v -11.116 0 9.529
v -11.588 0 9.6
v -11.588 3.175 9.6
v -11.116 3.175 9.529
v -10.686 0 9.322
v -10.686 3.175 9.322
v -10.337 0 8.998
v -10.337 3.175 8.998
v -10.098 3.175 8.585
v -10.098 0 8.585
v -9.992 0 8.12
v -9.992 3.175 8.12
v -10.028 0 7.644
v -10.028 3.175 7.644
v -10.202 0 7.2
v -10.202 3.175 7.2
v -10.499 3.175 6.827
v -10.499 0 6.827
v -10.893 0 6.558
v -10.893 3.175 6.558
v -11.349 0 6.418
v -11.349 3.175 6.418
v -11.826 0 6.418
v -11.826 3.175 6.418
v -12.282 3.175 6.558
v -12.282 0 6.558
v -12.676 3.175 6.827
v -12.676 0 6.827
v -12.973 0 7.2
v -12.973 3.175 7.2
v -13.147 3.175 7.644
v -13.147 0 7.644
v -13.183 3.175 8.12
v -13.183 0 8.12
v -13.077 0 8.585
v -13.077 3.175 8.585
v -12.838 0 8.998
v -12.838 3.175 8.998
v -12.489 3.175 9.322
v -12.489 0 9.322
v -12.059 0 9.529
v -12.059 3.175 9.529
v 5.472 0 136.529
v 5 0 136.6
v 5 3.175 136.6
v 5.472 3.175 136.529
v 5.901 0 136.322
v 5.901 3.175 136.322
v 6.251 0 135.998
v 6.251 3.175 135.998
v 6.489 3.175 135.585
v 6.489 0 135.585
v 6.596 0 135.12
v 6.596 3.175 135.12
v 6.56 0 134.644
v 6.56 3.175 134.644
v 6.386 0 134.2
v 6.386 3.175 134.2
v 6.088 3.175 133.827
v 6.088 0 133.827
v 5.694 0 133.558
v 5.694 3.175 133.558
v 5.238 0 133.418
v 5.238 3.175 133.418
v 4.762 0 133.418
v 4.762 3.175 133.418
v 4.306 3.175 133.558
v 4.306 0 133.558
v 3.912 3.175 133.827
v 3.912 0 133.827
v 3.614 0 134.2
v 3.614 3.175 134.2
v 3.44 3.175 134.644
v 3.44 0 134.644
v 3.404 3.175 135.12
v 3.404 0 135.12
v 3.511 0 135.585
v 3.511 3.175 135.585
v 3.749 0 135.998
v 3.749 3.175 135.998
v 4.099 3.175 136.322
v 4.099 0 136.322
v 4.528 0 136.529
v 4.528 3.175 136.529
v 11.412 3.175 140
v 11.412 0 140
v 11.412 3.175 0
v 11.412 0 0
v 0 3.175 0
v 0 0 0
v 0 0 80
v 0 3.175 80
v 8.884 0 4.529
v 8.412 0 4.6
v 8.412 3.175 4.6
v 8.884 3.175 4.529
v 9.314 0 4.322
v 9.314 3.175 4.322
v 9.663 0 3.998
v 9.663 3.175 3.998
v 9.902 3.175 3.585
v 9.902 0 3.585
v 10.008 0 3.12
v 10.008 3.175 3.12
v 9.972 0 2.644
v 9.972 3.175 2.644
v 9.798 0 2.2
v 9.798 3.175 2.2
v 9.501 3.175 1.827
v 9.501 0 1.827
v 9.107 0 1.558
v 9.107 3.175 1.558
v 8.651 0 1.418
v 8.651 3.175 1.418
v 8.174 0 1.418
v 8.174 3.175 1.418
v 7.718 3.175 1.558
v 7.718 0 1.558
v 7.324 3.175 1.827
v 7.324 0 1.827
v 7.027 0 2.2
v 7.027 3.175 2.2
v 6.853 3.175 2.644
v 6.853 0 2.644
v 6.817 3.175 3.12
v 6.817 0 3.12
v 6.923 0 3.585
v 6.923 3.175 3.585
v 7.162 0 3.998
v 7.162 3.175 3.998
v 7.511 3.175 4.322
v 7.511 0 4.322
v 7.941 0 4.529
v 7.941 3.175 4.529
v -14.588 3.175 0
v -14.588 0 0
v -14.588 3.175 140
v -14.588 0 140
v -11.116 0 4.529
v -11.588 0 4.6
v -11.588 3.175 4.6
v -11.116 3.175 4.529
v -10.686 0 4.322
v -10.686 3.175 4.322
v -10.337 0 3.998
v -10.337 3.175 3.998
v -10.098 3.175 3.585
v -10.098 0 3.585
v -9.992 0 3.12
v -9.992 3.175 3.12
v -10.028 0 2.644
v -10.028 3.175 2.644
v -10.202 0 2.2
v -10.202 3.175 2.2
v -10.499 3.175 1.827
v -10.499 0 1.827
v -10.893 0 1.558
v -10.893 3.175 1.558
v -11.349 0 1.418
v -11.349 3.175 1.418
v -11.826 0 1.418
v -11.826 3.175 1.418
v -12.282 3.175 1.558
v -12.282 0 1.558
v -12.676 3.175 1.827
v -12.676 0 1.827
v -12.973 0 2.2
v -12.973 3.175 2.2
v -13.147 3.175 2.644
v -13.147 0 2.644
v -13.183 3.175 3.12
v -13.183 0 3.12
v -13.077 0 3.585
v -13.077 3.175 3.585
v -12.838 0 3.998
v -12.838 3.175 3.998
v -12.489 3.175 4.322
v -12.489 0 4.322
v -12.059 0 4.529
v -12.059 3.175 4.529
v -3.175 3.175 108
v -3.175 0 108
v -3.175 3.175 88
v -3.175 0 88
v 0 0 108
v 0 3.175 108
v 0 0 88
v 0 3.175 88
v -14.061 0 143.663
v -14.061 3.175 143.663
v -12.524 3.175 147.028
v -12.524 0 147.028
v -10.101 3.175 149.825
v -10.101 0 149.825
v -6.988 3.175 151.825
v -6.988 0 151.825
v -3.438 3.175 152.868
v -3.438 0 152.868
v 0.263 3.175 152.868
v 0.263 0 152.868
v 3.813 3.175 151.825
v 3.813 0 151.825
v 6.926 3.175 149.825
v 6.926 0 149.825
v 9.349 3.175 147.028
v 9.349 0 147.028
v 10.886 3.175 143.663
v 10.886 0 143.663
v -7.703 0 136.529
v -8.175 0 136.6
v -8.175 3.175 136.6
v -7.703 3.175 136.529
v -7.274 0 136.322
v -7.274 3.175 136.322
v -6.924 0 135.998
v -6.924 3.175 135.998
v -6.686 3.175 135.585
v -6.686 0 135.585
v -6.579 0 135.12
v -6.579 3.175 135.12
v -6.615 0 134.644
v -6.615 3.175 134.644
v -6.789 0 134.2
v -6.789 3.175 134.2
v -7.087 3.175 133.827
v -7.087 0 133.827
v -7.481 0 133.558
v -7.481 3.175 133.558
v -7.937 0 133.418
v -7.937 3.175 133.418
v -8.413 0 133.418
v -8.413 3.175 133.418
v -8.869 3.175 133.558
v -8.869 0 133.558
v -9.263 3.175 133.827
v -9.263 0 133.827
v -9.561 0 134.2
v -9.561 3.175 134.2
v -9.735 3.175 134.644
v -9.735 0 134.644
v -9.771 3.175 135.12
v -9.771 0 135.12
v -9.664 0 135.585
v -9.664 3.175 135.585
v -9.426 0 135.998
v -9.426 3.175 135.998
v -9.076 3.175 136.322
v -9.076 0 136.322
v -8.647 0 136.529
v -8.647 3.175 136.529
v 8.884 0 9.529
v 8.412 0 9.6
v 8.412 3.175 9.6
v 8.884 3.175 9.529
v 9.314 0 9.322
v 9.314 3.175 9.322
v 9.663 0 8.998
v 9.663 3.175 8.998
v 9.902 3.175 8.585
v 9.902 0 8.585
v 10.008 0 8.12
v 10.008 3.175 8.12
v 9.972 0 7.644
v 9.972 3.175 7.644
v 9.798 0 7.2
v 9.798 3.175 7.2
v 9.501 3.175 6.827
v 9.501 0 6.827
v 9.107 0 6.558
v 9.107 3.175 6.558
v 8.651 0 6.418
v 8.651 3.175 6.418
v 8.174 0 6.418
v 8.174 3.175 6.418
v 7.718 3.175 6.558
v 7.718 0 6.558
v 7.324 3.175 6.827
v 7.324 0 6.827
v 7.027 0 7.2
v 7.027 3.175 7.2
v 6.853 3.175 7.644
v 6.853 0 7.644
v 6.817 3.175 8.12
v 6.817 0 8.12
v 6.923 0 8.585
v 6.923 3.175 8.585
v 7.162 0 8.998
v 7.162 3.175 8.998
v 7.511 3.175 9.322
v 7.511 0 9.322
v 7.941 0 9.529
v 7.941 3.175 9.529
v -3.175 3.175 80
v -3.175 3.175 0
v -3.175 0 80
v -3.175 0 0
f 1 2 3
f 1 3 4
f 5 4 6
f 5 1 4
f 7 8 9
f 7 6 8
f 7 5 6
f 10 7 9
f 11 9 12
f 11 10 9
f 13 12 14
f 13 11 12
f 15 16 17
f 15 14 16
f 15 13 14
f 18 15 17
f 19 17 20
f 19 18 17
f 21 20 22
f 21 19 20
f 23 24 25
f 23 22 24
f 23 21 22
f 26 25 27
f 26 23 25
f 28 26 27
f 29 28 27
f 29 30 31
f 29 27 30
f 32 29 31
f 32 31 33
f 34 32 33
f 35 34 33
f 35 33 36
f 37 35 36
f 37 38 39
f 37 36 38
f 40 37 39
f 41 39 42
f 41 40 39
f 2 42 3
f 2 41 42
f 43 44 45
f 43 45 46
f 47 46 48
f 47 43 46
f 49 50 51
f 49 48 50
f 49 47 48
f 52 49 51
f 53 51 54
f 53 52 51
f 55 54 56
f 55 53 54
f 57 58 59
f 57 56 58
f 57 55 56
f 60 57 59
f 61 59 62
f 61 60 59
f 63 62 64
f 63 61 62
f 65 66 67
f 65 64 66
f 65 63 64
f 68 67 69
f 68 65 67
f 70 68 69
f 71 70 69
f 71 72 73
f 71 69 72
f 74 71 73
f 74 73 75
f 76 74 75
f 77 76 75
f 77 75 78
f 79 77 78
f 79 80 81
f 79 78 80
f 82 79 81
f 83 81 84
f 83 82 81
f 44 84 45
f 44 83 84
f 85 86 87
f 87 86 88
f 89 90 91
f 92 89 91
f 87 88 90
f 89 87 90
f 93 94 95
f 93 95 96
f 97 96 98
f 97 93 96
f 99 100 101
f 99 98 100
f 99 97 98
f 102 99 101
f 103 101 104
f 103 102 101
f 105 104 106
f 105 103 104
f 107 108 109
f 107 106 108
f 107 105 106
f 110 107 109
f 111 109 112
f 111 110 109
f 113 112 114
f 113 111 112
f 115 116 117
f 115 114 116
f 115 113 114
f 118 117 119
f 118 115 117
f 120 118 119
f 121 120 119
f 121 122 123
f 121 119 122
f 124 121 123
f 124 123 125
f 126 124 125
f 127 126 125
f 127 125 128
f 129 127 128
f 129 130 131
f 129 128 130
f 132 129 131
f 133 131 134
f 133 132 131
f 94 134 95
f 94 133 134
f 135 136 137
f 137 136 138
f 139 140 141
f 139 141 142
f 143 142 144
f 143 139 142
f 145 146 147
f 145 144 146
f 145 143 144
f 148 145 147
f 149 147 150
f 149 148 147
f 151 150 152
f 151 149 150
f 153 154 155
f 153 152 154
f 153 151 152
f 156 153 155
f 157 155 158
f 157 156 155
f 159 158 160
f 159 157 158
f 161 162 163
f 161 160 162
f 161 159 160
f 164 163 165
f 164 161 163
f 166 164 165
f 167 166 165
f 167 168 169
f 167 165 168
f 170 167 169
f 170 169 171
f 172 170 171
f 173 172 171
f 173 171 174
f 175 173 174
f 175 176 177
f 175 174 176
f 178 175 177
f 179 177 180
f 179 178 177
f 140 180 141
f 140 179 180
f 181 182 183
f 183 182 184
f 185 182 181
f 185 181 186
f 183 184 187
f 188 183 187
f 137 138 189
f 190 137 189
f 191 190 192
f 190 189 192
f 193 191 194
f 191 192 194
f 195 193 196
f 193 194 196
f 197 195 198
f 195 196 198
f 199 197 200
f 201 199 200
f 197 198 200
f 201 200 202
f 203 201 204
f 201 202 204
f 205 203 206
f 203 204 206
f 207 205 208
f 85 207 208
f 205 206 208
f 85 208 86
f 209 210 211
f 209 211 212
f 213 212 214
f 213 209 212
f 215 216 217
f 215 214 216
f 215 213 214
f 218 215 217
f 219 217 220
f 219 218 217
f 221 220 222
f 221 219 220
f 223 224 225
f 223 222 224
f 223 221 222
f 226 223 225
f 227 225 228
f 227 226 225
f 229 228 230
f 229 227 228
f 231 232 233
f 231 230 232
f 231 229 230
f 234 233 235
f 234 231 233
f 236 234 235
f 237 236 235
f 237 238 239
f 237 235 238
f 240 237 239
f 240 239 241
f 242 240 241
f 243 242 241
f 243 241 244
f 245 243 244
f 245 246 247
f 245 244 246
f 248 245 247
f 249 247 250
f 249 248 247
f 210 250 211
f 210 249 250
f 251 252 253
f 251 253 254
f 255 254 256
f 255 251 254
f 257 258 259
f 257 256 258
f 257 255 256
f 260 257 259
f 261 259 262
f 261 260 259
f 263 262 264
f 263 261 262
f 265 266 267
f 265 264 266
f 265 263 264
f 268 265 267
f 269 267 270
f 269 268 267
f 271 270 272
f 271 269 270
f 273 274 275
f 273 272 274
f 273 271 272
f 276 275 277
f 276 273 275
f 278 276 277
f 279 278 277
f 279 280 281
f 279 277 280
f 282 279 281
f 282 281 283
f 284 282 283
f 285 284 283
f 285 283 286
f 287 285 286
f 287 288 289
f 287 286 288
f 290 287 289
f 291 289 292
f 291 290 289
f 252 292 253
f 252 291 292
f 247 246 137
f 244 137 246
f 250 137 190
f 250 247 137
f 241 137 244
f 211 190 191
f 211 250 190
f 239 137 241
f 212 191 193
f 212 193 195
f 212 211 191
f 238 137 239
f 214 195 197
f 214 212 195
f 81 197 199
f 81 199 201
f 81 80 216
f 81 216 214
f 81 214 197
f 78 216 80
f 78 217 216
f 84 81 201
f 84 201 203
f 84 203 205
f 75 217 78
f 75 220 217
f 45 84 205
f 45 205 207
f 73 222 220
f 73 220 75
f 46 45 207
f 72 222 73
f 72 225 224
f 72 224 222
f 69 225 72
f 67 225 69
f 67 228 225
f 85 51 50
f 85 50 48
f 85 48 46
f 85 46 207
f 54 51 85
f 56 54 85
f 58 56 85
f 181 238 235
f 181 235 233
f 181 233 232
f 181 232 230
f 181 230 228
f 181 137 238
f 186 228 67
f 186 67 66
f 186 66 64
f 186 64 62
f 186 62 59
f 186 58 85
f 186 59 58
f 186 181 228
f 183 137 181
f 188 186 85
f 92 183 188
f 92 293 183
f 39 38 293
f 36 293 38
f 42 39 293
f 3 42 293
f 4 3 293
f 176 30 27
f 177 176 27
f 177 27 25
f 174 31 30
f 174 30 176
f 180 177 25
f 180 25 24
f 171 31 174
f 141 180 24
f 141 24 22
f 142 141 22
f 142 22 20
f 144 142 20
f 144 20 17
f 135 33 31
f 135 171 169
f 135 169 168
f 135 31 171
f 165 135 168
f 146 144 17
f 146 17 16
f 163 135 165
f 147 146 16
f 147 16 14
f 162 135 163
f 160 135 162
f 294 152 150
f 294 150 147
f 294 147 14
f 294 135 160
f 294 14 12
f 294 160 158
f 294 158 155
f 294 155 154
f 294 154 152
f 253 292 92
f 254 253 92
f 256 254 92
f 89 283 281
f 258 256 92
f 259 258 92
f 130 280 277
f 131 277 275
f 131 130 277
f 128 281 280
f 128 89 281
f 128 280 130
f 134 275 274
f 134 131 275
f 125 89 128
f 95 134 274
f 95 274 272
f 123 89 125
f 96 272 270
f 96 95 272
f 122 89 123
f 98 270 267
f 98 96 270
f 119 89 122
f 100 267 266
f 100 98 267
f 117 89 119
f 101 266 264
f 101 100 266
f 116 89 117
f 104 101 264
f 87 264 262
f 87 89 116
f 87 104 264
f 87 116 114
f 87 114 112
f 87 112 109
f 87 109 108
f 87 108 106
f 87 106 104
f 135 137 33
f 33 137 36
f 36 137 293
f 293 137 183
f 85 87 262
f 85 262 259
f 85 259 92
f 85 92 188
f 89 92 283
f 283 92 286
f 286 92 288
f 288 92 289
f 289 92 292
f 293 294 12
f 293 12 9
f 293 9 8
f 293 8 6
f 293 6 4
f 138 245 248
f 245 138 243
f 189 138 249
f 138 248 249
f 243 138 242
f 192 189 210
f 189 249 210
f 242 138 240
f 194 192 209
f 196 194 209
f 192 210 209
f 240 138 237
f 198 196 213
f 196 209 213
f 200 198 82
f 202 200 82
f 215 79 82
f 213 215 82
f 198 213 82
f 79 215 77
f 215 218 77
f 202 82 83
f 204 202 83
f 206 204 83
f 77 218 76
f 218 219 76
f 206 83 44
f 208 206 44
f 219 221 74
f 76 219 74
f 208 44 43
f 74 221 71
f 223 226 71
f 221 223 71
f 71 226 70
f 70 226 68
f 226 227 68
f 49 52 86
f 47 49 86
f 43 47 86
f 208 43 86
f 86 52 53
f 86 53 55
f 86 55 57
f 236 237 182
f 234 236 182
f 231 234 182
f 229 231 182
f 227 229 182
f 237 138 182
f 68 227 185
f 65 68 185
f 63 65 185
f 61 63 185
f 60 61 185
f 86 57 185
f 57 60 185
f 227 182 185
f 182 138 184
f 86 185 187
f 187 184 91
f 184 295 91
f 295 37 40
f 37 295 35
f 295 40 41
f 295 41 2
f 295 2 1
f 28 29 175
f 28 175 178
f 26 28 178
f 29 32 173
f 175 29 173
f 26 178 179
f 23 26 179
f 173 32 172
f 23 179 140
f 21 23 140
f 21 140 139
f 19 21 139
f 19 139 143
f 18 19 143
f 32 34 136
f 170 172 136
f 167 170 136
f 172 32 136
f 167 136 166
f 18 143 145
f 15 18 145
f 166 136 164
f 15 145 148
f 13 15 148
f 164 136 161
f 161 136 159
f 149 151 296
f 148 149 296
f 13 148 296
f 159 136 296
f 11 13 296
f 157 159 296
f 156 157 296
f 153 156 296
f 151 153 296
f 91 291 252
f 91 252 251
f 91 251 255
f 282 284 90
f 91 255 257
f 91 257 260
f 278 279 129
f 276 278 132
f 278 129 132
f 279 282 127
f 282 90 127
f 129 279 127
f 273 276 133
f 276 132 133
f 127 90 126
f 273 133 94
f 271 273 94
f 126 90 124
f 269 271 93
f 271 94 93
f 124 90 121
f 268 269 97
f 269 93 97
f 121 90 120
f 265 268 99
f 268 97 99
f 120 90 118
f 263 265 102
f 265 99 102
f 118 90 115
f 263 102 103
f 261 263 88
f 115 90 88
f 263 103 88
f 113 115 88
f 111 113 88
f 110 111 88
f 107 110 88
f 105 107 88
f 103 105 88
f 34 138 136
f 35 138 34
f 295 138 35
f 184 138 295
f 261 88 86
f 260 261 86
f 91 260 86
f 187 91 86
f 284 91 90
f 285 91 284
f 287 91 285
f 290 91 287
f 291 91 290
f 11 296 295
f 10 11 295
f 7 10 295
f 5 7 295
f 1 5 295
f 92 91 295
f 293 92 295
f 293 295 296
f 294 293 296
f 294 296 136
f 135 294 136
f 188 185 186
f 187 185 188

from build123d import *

# Parameters (mm, degrees)
SKETCH1_W               = 3.175
SKETCH1_H               = 20
BOSS_EXTRUDE1_DEPTH     = 3.175
CUT_EXTRUDE1_DEPTH      = 154.72662678
CUT_EXTRUDE1_DEPTH_BACK = 154.72662678
SKETCH2_R               = 1.6
CUT_EXTRUDE2_DEPTH      = 154.72662678
CUT_EXTRUDE2_DEPTH_BACK = 154.72662678
SKETCH3_R               = 1.6


with BuildPart() as part:
    # Sketch1 → Boss-Extrude1 (new body)
    with BuildSketch(Plane(origin=(0, 0, 0), x_dir=(1, 0, 0), z_dir=(0, 1, 0))):
        with BuildLine():
            Line((-14.5875, 0), (-14.5875, -140))
            ThreePointArc((-14.5875, -140), (-1.5875, -153), (11.4125, -140))
            Line((11.4125, -140), (11.4125, 0))
            Line((11.4125, 0), (0, 0))
            Line((0, 0), (0, -80))
            Line((0, -80), (-3.175, -80))
            Line((-3.175, -80), (-3.175, 0))
            Line((-3.175, 0), (-14.5875, 0))
        make_face()
        with Locations((-1.5875, -98)):
            Rectangle(SKETCH1_W, SKETCH1_H, mode=Mode.SUBTRACT)
    extrude(amount=BOSS_EXTRUDE1_DEPTH)

    # Sketch2 → Cut-Extrude1 (cut, two sides: drawn at the far end of the back side and taken through both)
    with BuildSketch(Plane(origin=(0, 3.175, 0), x_dir=(1, 0, 0), z_dir=(0, 1, 0)).offset(-CUT_EXTRUDE1_DEPTH_BACK)):
        with Locations(Location((5, -135, 0), (0, 0, 270))):
            Circle(SKETCH2_R)
        with Locations(Location((-8.175, -135, 0), (0, 0, 270))):
            Circle(SKETCH2_R)
    extrude(amount=CUT_EXTRUDE1_DEPTH + CUT_EXTRUDE1_DEPTH_BACK, mode=Mode.SUBTRACT)

    # Sketch3 → Cut-Extrude2 (cut, two sides: drawn at the far end of the back side and taken through both)
    with BuildSketch(Plane(origin=(0, 3.175, 0), x_dir=(1, 0, 0), z_dir=(0, 1, 0)).offset(-CUT_EXTRUDE2_DEPTH_BACK)):
        with Locations(Location((-11.5875, -8, 0), (0, 0, 270))):
            Circle(SKETCH3_R)
        with Locations(Location((-11.5875, -3, 0), (0, 0, 270))):
            Circle(SKETCH3_R)
        with Locations(Location((8.4125, -8, 0), (0, 0, 270))):
            Circle(SKETCH3_R)
        with Locations(Location((8.4125, -3, 0), (0, 0, 270))):
            Circle(SKETCH3_R)
    extrude(amount=CUT_EXTRUDE2_DEPTH + CUT_EXTRUDE2_DEPTH_BACK, mode=Mode.SUBTRACT)


solid = part.part
